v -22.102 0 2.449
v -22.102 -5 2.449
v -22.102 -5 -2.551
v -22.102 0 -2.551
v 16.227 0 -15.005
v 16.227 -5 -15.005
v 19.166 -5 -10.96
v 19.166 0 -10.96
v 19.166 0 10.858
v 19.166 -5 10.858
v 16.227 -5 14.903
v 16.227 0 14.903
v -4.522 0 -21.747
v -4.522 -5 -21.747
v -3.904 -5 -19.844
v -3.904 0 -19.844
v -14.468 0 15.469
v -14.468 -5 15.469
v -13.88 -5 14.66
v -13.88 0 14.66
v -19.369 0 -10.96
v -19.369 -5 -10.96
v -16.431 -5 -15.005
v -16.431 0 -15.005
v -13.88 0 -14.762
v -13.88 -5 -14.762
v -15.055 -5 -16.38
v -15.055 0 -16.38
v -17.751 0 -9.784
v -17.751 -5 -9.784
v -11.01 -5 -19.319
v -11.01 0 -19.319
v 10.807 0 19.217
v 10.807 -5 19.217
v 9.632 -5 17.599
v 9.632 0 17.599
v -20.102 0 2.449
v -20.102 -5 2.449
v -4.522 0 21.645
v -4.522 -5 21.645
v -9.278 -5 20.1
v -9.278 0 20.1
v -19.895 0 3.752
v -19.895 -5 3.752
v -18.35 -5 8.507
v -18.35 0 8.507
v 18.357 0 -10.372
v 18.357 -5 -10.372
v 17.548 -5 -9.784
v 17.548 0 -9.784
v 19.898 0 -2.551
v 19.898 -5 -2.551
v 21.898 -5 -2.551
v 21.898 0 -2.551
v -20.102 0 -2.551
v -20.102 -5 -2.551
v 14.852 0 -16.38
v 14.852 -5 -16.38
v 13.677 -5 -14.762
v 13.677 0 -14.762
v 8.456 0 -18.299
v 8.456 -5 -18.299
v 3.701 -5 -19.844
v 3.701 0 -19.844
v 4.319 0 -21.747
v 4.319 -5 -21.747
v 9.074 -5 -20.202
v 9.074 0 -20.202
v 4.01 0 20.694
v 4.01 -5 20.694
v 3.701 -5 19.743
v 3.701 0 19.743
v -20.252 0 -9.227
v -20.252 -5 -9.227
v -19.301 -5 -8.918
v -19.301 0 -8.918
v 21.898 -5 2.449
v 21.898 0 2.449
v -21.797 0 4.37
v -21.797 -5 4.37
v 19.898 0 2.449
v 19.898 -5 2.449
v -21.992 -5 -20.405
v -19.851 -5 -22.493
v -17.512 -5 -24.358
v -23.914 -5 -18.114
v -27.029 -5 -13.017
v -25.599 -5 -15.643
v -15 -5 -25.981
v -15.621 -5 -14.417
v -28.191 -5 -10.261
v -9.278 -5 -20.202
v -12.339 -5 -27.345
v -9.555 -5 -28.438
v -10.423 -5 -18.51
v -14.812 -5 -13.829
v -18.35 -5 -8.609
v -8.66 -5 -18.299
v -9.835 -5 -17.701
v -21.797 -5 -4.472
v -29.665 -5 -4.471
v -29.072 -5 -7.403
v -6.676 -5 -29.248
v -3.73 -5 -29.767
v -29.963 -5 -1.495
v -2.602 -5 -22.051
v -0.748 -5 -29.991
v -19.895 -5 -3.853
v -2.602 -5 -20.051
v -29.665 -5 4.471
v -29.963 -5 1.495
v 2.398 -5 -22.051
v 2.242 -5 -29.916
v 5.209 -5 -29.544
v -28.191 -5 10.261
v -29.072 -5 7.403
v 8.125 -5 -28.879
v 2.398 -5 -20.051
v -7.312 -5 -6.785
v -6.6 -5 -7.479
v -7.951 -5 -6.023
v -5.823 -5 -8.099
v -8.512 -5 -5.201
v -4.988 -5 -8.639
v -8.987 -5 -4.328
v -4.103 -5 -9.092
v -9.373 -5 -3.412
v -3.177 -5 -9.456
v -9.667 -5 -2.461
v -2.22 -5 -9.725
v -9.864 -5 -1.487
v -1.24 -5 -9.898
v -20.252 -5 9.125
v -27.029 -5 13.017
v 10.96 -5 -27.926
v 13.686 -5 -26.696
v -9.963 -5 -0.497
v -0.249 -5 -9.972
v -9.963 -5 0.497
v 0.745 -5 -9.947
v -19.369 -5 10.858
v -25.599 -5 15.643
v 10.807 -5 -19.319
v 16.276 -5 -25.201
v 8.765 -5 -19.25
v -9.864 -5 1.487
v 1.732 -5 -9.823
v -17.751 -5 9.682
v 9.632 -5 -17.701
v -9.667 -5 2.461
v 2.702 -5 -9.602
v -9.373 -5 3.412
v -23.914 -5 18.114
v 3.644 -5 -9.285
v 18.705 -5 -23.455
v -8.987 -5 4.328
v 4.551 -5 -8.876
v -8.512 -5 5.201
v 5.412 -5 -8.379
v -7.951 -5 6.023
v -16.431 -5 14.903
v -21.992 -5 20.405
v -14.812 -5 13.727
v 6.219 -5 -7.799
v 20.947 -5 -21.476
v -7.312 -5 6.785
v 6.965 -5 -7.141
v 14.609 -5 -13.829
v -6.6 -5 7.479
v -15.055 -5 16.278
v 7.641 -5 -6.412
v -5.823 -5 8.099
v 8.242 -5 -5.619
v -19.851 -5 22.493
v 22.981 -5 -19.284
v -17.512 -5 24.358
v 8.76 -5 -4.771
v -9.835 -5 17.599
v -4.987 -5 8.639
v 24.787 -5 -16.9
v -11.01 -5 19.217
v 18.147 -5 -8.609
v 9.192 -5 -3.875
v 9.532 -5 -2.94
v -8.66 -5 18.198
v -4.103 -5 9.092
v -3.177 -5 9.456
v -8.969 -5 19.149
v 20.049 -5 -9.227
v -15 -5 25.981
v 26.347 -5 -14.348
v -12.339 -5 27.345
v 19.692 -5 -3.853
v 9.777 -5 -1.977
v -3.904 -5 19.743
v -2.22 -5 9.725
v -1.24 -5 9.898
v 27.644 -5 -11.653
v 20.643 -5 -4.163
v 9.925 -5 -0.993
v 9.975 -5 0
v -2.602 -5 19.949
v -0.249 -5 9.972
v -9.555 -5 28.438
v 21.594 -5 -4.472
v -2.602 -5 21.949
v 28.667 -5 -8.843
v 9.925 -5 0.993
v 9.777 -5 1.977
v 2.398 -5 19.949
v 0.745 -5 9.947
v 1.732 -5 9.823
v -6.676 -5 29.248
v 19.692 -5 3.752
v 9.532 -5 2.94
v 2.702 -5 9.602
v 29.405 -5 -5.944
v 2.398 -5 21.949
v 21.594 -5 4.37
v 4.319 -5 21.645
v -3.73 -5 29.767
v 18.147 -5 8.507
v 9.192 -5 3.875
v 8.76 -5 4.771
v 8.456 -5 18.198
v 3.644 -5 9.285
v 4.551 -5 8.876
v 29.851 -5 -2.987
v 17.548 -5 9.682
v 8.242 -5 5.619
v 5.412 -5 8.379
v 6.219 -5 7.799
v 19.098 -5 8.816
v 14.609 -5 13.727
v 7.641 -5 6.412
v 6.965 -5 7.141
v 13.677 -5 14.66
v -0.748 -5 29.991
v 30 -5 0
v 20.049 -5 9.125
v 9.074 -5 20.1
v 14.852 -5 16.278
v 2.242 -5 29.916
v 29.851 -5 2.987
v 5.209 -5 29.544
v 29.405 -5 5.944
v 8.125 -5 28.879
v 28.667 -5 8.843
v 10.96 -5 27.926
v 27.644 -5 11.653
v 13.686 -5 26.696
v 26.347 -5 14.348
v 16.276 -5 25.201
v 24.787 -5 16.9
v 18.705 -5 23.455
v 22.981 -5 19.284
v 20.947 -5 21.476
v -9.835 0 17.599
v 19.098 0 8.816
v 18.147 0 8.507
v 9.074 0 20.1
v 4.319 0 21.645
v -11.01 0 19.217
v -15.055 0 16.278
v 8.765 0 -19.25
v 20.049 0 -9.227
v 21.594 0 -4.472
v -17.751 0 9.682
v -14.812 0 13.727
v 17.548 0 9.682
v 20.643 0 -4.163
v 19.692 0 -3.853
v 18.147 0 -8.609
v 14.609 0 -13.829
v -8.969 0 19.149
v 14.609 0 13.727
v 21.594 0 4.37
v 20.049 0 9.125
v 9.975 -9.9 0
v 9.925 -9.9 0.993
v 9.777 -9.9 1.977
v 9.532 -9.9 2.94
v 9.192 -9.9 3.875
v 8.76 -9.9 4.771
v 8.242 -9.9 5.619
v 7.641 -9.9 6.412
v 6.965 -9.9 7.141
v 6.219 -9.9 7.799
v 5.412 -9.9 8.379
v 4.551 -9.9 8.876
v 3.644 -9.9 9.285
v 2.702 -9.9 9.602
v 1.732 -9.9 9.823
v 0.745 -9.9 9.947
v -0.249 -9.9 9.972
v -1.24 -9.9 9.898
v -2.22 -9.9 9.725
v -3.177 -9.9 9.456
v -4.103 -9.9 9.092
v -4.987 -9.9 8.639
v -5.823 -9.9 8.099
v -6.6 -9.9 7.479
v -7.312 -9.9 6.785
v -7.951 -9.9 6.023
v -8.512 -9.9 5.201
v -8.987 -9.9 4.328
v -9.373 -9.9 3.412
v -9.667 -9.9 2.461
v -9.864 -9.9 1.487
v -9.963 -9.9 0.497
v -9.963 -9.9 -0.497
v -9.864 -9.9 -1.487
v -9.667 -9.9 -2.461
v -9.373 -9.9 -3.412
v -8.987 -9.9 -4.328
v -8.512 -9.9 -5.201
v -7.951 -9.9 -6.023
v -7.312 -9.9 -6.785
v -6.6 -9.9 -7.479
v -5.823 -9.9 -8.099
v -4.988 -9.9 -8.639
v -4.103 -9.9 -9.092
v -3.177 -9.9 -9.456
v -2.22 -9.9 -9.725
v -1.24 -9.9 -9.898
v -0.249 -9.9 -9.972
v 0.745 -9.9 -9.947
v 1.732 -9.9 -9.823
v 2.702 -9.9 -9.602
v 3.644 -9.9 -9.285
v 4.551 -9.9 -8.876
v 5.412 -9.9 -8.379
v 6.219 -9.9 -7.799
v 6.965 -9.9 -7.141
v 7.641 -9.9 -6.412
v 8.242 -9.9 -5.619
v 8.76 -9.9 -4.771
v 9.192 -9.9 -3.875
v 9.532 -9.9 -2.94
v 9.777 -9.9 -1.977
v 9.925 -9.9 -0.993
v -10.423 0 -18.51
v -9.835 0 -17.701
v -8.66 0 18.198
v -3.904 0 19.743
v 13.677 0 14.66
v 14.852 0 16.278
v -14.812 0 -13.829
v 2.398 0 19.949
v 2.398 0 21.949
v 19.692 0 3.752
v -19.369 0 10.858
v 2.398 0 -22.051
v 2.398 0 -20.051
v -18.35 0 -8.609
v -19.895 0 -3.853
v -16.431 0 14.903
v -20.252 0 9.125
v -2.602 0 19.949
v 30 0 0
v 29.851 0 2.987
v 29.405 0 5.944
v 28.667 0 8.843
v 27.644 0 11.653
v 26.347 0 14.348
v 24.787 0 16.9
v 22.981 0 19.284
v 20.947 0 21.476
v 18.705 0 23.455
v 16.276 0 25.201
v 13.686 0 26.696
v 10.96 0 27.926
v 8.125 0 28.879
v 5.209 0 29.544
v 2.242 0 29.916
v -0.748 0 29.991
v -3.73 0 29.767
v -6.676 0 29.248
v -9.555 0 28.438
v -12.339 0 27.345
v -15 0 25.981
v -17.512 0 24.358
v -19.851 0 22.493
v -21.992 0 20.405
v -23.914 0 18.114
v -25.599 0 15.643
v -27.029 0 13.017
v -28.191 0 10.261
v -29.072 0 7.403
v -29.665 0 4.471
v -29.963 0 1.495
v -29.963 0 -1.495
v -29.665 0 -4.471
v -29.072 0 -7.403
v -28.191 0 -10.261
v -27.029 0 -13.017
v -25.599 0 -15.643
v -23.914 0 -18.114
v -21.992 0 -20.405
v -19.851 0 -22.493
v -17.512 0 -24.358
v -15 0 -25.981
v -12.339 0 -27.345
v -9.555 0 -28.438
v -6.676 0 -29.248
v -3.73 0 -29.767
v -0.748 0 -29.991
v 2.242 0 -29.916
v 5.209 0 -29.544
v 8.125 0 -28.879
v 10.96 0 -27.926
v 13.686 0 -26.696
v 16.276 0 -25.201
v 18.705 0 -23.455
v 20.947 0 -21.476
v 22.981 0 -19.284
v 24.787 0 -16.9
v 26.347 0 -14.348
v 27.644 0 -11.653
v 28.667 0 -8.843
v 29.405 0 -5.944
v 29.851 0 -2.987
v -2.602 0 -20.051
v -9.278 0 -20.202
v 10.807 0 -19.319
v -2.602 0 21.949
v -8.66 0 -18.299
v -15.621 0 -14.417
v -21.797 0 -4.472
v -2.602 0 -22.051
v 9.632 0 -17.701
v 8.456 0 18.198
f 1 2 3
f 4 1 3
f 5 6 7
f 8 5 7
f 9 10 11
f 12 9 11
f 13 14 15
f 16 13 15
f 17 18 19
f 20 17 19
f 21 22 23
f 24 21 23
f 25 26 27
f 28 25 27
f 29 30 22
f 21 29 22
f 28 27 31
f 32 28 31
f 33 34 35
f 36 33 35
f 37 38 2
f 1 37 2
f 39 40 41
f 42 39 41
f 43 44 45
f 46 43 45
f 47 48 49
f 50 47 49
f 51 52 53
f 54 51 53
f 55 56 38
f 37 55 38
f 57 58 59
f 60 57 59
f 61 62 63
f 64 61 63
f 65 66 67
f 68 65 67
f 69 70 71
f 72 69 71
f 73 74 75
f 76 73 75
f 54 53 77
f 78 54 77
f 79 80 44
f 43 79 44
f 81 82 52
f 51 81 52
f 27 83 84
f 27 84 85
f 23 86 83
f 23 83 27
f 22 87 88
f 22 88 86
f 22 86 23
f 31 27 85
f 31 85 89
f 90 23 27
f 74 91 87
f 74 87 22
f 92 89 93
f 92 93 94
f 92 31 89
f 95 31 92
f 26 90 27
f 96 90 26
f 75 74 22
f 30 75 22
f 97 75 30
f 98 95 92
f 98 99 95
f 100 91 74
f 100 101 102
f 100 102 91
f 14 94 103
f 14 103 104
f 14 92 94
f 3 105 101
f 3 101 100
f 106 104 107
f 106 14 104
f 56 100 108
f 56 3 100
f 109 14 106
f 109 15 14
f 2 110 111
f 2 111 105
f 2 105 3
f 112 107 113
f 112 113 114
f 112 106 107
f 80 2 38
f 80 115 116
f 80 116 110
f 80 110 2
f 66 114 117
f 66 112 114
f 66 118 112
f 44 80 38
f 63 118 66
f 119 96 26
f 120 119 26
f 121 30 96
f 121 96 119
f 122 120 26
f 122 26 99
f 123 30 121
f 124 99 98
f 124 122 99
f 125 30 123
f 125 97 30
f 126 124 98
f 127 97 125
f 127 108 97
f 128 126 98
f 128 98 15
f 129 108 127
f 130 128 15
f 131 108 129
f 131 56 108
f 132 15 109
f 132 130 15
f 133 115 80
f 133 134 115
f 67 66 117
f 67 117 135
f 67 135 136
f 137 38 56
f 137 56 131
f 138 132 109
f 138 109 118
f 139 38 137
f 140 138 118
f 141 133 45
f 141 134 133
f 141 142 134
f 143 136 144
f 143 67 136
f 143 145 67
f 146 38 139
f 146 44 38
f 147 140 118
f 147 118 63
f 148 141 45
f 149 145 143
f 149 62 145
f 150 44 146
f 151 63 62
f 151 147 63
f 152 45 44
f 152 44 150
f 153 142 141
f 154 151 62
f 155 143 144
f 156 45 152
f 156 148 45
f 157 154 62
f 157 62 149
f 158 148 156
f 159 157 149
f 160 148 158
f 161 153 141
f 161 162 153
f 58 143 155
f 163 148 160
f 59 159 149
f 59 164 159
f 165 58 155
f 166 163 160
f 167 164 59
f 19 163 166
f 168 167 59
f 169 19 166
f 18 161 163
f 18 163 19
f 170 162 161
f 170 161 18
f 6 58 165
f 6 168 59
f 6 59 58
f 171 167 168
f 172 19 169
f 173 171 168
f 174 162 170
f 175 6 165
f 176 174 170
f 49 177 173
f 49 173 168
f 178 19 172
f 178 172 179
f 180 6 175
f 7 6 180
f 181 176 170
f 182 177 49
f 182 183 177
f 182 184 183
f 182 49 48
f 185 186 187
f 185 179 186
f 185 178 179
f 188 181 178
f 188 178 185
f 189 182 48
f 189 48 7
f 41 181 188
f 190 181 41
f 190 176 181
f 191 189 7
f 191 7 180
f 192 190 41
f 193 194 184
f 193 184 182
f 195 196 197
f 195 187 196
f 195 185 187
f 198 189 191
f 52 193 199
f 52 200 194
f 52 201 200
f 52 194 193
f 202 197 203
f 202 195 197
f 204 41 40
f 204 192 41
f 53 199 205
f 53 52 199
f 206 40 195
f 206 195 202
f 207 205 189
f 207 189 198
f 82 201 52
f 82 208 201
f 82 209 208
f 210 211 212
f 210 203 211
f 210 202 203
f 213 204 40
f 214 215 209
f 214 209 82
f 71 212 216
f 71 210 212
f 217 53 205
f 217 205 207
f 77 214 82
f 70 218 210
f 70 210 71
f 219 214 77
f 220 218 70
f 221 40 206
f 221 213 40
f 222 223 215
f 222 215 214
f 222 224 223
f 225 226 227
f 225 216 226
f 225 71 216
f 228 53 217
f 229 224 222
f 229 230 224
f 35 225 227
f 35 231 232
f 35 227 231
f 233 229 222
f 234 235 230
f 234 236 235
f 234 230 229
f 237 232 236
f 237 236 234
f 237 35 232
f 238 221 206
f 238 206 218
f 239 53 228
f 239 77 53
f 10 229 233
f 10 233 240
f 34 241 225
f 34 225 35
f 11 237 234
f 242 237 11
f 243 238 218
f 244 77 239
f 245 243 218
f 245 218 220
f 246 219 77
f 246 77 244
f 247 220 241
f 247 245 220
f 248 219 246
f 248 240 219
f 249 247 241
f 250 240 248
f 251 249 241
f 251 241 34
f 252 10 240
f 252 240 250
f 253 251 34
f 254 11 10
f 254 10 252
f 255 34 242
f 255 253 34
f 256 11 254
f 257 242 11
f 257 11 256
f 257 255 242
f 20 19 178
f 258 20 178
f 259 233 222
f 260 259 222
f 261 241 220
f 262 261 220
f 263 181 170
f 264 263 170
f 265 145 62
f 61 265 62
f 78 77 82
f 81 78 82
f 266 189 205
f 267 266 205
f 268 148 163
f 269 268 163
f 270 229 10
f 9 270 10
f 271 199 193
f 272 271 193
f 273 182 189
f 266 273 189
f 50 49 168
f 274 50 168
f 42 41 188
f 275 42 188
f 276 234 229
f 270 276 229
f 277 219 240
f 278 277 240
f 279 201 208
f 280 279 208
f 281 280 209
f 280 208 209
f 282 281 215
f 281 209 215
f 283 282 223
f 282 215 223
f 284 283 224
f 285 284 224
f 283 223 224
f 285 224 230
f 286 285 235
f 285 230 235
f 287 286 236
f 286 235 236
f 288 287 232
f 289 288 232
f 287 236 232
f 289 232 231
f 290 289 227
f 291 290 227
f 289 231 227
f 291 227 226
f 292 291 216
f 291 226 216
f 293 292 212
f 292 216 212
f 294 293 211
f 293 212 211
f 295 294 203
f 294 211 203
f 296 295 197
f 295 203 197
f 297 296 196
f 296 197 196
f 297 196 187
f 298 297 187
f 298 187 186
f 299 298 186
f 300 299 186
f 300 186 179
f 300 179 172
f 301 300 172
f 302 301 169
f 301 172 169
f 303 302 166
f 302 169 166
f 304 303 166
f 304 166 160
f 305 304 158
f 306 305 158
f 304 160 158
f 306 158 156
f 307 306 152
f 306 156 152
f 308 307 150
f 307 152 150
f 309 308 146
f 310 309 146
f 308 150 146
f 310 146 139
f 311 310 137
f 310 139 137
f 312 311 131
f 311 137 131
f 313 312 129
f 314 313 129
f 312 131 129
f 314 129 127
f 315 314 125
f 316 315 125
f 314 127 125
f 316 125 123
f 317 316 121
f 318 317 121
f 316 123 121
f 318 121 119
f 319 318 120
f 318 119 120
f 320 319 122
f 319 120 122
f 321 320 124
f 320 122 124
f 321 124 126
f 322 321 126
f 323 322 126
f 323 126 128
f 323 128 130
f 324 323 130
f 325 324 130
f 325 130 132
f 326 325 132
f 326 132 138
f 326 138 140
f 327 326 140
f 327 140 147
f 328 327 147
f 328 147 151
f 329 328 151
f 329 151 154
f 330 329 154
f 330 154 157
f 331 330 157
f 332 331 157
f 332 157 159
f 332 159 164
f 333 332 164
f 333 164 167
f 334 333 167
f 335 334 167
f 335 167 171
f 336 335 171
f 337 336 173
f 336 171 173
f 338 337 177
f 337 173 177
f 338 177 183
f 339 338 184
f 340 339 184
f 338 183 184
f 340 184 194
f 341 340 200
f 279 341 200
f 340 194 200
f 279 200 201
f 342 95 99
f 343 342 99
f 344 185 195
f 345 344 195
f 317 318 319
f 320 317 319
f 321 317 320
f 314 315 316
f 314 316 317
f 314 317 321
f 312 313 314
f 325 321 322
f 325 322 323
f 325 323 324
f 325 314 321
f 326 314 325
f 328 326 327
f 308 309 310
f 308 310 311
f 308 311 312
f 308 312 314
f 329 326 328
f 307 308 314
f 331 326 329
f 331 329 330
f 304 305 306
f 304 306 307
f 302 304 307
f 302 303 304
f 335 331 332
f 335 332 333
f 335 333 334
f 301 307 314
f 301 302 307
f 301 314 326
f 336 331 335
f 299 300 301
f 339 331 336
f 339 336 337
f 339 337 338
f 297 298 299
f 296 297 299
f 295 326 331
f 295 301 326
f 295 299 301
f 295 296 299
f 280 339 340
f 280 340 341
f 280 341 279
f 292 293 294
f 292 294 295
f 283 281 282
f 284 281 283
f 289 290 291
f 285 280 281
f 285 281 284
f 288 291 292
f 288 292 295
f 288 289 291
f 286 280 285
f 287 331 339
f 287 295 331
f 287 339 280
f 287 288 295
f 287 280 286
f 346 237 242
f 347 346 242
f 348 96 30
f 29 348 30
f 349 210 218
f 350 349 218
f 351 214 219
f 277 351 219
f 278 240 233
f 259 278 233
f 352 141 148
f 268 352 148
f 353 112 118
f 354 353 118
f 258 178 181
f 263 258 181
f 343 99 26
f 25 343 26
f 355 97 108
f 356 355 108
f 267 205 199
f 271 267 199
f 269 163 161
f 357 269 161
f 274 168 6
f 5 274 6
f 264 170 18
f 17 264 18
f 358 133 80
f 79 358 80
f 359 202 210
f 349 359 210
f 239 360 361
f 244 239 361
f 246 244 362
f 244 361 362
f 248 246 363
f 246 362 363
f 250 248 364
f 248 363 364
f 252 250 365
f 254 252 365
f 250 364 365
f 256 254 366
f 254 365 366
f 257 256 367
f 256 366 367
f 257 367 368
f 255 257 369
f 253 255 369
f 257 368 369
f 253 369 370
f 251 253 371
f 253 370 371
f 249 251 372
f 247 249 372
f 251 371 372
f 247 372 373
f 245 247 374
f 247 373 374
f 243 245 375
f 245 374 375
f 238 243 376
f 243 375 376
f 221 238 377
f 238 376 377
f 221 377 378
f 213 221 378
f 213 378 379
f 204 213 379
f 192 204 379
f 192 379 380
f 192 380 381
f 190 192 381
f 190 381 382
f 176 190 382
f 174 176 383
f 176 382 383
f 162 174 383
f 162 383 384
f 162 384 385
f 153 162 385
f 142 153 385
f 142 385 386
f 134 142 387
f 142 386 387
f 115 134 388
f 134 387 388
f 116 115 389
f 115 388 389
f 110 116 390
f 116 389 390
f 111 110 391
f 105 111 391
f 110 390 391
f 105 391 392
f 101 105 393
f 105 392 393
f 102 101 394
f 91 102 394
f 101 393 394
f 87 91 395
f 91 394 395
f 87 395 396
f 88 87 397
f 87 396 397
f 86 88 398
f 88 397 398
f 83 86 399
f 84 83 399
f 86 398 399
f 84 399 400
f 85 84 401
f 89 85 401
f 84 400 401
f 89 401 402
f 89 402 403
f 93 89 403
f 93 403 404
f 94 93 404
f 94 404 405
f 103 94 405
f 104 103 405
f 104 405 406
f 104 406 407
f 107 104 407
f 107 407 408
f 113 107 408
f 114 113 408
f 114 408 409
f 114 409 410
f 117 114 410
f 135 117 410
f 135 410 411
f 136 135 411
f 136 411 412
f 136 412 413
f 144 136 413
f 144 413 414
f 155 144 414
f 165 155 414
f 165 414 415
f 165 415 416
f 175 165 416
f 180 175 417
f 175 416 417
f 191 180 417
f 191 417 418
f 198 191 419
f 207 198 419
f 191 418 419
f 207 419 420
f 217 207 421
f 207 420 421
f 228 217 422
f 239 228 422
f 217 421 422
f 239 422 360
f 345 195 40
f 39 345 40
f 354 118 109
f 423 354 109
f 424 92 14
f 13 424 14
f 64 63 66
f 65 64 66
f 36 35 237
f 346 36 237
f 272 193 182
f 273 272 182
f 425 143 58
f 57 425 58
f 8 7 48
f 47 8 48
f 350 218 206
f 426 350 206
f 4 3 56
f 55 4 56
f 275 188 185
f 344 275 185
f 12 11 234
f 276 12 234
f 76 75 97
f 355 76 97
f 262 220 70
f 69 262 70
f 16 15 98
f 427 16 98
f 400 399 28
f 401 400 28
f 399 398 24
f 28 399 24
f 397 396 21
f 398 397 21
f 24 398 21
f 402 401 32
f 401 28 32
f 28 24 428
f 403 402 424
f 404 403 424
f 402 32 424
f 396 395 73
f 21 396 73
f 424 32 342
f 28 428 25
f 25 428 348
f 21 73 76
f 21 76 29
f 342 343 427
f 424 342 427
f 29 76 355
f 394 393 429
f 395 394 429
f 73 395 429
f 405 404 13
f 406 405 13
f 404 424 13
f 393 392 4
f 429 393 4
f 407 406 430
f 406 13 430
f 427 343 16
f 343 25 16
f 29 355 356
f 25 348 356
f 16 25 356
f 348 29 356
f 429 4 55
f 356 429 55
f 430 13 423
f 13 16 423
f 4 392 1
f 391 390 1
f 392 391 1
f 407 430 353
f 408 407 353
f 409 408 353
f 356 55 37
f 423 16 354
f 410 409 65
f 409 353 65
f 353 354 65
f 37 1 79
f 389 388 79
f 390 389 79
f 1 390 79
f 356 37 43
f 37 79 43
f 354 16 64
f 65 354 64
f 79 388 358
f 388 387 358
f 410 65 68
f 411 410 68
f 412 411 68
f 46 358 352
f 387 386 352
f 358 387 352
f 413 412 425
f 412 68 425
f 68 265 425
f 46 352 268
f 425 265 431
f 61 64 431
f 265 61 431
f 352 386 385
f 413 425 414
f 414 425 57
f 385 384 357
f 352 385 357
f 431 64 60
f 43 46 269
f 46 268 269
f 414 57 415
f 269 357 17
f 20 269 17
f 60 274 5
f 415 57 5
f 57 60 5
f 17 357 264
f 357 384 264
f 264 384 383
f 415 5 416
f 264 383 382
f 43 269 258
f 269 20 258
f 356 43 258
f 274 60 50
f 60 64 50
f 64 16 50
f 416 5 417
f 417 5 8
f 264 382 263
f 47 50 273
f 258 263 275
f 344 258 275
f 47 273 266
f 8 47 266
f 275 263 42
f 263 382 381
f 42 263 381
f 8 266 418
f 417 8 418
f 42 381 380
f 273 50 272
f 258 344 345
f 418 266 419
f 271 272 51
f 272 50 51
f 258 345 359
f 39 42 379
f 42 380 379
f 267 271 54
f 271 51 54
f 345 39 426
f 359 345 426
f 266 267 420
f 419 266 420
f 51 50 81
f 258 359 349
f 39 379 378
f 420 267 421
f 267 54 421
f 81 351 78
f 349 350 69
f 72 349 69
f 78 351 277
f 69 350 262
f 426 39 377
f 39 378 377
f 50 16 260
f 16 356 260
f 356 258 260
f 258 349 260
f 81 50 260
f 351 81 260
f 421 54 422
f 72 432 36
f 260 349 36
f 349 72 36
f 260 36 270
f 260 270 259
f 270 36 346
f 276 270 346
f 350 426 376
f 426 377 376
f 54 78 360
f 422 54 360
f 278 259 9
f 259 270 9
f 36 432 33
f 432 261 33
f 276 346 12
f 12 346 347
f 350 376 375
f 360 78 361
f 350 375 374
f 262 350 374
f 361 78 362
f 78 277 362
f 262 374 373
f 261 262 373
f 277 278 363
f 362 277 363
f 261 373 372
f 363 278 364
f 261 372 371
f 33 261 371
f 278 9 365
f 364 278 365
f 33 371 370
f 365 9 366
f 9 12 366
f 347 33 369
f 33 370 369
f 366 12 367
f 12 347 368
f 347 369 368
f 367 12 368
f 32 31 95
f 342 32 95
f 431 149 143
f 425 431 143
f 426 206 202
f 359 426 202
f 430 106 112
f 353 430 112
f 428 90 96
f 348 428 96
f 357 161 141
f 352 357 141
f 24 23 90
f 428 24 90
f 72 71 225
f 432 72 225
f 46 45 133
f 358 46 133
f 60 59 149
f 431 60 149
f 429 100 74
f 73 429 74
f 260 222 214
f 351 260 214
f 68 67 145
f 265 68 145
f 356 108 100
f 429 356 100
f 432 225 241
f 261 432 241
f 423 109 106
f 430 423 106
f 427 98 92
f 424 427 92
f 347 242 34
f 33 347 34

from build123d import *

# Parameters (mm, degrees)
F0_R     = 30
F1_DEPTH = 5
F3_DEPTH = 5.001
F4_R     = 9.975
F5_DEPTH = 4.9


with BuildPart() as f1:
    # F0 (on Front) → F1 (new body)
    with BuildSketch(Plane.XZ):
        Circle(F0_R)
    extrude(amount=F1_DEPTH)

    # F2 (on face) → F3 (cut, through all)
    with BuildSketch(Plane.XZ.offset(5)):
        Polygon((-2.601597, 21.949199), (-2.601597, 20.949199), (-2.601597, 19.949199), (2.398403, 19.949199), (2.398403, 21.949199), align=None)
        Polygon((-4.522329, 21.644985), (-9.277612, 20.0999), (-8.968595, 19.148844), (-8.659578, 18.197787), (-3.904295, 19.742872), align=None)
        Polygon((-11.01033, 19.217036), (-15.055415, 16.27811), (-14.467629, 15.469093), (-13.879844, 14.660076), (-9.834759, 17.599002), align=None)
        Polygon((-16.430507, 14.903017), (-19.369434, 10.857932), (-18.560417, 10.270147), (-17.7514, 9.682362), (-14.812473, 13.727447), align=None)
        Polygon((-20.252298, 9.125214), (-21.797383, 4.369932), (-20.846326, 4.060915), (-19.895269, 3.751898), (-18.350185, 8.50718), align=None)
        Polygon((-22.101597, 2.449199), (-22.101597, -2.550801), (-21.101597, -2.550801), (-20.101597, -2.550801), (-20.101597, 2.449199), align=None)
        Polygon((-21.797383, -4.471533), (-20.252298, -9.226816), (-19.301241, -8.917799), (-18.350185, -8.608782), (-19.895269, -3.853499), align=None)
        Polygon((-19.369434, -10.959534), (-16.430507, -15.004619), (-15.62149, -14.416833), (-14.812473, -13.829048), (-17.7514, -9.783963), align=None)
        Polygon((-15.055415, -16.379711), (-11.01033, -19.318638), (-10.422544, -18.509621), (-9.834759, -17.700604), (-13.879844, -14.761677), align=None)
        Polygon((-9.277612, -20.201502), (-4.522329, -21.746587), (-4.213312, -20.79553), (-3.904295, -19.844473), (-8.659578, -18.299389), align=None)
        Polygon((-2.601597, -22.050801), (2.398403, -22.050801), (2.398403, -21.050801), (2.398403, -20.050801), (-2.601597, -20.050801), align=None)
        Polygon((4.319136, -21.746587), (9.074419, -20.201502), (8.765402, -19.250445), (8.456385, -18.299389), (3.701102, -19.844473), align=None)
        Polygon((10.807136, -19.318638), (14.852221, -16.379711), (14.264436, -15.570694), (13.676651, -14.761677), (9.631566, -17.700604), align=None)
        Polygon((16.227314, -15.004619), (19.16624, -10.959534), (18.357223, -10.371748), (17.548206, -9.783963), (14.60928, -13.829048), align=None)
        Polygon((20.049104, -9.226816), (21.594189, -4.471533), (20.643133, -4.162516), (19.692076, -3.853499), (18.146991, -8.608782), align=None)
        Polygon((21.898403, -2.550801), (21.898403, 2.449199), (20.898403, 2.449199), (19.898403, 2.449199), (19.898403, -2.550801), align=None)
        Polygon((21.594189, 4.369932), (20.049104, 9.125214), (19.098048, 8.816197), (18.146991, 8.50718), (19.692076, 3.751898), align=None)
        Polygon((19.16624, 10.857932), (16.227314, 14.903017), (15.418297, 14.315232), (14.60928, 13.727447), (17.548206, 9.682362), align=None)
        Polygon((14.852221, 16.27811), (10.807136, 19.217036), (10.219351, 18.408019), (9.631566, 17.599002), (13.676651, 14.660076), align=None)
        Polygon((9.074419, 20.0999), (4.319136, 21.644985), (4.010119, 20.693929), (3.701102, 19.742872), (8.456385, 18.197787), align=None)
    extrude(amount=-F3_DEPTH, mode=Mode.SUBTRACT)

    # F4 (on face) → F5 (join)
    with BuildSketch(Plane.XZ.offset(5)):
        Circle(F4_R)
    extrude(amount=F5_DEPTH)


solid = f1.part
